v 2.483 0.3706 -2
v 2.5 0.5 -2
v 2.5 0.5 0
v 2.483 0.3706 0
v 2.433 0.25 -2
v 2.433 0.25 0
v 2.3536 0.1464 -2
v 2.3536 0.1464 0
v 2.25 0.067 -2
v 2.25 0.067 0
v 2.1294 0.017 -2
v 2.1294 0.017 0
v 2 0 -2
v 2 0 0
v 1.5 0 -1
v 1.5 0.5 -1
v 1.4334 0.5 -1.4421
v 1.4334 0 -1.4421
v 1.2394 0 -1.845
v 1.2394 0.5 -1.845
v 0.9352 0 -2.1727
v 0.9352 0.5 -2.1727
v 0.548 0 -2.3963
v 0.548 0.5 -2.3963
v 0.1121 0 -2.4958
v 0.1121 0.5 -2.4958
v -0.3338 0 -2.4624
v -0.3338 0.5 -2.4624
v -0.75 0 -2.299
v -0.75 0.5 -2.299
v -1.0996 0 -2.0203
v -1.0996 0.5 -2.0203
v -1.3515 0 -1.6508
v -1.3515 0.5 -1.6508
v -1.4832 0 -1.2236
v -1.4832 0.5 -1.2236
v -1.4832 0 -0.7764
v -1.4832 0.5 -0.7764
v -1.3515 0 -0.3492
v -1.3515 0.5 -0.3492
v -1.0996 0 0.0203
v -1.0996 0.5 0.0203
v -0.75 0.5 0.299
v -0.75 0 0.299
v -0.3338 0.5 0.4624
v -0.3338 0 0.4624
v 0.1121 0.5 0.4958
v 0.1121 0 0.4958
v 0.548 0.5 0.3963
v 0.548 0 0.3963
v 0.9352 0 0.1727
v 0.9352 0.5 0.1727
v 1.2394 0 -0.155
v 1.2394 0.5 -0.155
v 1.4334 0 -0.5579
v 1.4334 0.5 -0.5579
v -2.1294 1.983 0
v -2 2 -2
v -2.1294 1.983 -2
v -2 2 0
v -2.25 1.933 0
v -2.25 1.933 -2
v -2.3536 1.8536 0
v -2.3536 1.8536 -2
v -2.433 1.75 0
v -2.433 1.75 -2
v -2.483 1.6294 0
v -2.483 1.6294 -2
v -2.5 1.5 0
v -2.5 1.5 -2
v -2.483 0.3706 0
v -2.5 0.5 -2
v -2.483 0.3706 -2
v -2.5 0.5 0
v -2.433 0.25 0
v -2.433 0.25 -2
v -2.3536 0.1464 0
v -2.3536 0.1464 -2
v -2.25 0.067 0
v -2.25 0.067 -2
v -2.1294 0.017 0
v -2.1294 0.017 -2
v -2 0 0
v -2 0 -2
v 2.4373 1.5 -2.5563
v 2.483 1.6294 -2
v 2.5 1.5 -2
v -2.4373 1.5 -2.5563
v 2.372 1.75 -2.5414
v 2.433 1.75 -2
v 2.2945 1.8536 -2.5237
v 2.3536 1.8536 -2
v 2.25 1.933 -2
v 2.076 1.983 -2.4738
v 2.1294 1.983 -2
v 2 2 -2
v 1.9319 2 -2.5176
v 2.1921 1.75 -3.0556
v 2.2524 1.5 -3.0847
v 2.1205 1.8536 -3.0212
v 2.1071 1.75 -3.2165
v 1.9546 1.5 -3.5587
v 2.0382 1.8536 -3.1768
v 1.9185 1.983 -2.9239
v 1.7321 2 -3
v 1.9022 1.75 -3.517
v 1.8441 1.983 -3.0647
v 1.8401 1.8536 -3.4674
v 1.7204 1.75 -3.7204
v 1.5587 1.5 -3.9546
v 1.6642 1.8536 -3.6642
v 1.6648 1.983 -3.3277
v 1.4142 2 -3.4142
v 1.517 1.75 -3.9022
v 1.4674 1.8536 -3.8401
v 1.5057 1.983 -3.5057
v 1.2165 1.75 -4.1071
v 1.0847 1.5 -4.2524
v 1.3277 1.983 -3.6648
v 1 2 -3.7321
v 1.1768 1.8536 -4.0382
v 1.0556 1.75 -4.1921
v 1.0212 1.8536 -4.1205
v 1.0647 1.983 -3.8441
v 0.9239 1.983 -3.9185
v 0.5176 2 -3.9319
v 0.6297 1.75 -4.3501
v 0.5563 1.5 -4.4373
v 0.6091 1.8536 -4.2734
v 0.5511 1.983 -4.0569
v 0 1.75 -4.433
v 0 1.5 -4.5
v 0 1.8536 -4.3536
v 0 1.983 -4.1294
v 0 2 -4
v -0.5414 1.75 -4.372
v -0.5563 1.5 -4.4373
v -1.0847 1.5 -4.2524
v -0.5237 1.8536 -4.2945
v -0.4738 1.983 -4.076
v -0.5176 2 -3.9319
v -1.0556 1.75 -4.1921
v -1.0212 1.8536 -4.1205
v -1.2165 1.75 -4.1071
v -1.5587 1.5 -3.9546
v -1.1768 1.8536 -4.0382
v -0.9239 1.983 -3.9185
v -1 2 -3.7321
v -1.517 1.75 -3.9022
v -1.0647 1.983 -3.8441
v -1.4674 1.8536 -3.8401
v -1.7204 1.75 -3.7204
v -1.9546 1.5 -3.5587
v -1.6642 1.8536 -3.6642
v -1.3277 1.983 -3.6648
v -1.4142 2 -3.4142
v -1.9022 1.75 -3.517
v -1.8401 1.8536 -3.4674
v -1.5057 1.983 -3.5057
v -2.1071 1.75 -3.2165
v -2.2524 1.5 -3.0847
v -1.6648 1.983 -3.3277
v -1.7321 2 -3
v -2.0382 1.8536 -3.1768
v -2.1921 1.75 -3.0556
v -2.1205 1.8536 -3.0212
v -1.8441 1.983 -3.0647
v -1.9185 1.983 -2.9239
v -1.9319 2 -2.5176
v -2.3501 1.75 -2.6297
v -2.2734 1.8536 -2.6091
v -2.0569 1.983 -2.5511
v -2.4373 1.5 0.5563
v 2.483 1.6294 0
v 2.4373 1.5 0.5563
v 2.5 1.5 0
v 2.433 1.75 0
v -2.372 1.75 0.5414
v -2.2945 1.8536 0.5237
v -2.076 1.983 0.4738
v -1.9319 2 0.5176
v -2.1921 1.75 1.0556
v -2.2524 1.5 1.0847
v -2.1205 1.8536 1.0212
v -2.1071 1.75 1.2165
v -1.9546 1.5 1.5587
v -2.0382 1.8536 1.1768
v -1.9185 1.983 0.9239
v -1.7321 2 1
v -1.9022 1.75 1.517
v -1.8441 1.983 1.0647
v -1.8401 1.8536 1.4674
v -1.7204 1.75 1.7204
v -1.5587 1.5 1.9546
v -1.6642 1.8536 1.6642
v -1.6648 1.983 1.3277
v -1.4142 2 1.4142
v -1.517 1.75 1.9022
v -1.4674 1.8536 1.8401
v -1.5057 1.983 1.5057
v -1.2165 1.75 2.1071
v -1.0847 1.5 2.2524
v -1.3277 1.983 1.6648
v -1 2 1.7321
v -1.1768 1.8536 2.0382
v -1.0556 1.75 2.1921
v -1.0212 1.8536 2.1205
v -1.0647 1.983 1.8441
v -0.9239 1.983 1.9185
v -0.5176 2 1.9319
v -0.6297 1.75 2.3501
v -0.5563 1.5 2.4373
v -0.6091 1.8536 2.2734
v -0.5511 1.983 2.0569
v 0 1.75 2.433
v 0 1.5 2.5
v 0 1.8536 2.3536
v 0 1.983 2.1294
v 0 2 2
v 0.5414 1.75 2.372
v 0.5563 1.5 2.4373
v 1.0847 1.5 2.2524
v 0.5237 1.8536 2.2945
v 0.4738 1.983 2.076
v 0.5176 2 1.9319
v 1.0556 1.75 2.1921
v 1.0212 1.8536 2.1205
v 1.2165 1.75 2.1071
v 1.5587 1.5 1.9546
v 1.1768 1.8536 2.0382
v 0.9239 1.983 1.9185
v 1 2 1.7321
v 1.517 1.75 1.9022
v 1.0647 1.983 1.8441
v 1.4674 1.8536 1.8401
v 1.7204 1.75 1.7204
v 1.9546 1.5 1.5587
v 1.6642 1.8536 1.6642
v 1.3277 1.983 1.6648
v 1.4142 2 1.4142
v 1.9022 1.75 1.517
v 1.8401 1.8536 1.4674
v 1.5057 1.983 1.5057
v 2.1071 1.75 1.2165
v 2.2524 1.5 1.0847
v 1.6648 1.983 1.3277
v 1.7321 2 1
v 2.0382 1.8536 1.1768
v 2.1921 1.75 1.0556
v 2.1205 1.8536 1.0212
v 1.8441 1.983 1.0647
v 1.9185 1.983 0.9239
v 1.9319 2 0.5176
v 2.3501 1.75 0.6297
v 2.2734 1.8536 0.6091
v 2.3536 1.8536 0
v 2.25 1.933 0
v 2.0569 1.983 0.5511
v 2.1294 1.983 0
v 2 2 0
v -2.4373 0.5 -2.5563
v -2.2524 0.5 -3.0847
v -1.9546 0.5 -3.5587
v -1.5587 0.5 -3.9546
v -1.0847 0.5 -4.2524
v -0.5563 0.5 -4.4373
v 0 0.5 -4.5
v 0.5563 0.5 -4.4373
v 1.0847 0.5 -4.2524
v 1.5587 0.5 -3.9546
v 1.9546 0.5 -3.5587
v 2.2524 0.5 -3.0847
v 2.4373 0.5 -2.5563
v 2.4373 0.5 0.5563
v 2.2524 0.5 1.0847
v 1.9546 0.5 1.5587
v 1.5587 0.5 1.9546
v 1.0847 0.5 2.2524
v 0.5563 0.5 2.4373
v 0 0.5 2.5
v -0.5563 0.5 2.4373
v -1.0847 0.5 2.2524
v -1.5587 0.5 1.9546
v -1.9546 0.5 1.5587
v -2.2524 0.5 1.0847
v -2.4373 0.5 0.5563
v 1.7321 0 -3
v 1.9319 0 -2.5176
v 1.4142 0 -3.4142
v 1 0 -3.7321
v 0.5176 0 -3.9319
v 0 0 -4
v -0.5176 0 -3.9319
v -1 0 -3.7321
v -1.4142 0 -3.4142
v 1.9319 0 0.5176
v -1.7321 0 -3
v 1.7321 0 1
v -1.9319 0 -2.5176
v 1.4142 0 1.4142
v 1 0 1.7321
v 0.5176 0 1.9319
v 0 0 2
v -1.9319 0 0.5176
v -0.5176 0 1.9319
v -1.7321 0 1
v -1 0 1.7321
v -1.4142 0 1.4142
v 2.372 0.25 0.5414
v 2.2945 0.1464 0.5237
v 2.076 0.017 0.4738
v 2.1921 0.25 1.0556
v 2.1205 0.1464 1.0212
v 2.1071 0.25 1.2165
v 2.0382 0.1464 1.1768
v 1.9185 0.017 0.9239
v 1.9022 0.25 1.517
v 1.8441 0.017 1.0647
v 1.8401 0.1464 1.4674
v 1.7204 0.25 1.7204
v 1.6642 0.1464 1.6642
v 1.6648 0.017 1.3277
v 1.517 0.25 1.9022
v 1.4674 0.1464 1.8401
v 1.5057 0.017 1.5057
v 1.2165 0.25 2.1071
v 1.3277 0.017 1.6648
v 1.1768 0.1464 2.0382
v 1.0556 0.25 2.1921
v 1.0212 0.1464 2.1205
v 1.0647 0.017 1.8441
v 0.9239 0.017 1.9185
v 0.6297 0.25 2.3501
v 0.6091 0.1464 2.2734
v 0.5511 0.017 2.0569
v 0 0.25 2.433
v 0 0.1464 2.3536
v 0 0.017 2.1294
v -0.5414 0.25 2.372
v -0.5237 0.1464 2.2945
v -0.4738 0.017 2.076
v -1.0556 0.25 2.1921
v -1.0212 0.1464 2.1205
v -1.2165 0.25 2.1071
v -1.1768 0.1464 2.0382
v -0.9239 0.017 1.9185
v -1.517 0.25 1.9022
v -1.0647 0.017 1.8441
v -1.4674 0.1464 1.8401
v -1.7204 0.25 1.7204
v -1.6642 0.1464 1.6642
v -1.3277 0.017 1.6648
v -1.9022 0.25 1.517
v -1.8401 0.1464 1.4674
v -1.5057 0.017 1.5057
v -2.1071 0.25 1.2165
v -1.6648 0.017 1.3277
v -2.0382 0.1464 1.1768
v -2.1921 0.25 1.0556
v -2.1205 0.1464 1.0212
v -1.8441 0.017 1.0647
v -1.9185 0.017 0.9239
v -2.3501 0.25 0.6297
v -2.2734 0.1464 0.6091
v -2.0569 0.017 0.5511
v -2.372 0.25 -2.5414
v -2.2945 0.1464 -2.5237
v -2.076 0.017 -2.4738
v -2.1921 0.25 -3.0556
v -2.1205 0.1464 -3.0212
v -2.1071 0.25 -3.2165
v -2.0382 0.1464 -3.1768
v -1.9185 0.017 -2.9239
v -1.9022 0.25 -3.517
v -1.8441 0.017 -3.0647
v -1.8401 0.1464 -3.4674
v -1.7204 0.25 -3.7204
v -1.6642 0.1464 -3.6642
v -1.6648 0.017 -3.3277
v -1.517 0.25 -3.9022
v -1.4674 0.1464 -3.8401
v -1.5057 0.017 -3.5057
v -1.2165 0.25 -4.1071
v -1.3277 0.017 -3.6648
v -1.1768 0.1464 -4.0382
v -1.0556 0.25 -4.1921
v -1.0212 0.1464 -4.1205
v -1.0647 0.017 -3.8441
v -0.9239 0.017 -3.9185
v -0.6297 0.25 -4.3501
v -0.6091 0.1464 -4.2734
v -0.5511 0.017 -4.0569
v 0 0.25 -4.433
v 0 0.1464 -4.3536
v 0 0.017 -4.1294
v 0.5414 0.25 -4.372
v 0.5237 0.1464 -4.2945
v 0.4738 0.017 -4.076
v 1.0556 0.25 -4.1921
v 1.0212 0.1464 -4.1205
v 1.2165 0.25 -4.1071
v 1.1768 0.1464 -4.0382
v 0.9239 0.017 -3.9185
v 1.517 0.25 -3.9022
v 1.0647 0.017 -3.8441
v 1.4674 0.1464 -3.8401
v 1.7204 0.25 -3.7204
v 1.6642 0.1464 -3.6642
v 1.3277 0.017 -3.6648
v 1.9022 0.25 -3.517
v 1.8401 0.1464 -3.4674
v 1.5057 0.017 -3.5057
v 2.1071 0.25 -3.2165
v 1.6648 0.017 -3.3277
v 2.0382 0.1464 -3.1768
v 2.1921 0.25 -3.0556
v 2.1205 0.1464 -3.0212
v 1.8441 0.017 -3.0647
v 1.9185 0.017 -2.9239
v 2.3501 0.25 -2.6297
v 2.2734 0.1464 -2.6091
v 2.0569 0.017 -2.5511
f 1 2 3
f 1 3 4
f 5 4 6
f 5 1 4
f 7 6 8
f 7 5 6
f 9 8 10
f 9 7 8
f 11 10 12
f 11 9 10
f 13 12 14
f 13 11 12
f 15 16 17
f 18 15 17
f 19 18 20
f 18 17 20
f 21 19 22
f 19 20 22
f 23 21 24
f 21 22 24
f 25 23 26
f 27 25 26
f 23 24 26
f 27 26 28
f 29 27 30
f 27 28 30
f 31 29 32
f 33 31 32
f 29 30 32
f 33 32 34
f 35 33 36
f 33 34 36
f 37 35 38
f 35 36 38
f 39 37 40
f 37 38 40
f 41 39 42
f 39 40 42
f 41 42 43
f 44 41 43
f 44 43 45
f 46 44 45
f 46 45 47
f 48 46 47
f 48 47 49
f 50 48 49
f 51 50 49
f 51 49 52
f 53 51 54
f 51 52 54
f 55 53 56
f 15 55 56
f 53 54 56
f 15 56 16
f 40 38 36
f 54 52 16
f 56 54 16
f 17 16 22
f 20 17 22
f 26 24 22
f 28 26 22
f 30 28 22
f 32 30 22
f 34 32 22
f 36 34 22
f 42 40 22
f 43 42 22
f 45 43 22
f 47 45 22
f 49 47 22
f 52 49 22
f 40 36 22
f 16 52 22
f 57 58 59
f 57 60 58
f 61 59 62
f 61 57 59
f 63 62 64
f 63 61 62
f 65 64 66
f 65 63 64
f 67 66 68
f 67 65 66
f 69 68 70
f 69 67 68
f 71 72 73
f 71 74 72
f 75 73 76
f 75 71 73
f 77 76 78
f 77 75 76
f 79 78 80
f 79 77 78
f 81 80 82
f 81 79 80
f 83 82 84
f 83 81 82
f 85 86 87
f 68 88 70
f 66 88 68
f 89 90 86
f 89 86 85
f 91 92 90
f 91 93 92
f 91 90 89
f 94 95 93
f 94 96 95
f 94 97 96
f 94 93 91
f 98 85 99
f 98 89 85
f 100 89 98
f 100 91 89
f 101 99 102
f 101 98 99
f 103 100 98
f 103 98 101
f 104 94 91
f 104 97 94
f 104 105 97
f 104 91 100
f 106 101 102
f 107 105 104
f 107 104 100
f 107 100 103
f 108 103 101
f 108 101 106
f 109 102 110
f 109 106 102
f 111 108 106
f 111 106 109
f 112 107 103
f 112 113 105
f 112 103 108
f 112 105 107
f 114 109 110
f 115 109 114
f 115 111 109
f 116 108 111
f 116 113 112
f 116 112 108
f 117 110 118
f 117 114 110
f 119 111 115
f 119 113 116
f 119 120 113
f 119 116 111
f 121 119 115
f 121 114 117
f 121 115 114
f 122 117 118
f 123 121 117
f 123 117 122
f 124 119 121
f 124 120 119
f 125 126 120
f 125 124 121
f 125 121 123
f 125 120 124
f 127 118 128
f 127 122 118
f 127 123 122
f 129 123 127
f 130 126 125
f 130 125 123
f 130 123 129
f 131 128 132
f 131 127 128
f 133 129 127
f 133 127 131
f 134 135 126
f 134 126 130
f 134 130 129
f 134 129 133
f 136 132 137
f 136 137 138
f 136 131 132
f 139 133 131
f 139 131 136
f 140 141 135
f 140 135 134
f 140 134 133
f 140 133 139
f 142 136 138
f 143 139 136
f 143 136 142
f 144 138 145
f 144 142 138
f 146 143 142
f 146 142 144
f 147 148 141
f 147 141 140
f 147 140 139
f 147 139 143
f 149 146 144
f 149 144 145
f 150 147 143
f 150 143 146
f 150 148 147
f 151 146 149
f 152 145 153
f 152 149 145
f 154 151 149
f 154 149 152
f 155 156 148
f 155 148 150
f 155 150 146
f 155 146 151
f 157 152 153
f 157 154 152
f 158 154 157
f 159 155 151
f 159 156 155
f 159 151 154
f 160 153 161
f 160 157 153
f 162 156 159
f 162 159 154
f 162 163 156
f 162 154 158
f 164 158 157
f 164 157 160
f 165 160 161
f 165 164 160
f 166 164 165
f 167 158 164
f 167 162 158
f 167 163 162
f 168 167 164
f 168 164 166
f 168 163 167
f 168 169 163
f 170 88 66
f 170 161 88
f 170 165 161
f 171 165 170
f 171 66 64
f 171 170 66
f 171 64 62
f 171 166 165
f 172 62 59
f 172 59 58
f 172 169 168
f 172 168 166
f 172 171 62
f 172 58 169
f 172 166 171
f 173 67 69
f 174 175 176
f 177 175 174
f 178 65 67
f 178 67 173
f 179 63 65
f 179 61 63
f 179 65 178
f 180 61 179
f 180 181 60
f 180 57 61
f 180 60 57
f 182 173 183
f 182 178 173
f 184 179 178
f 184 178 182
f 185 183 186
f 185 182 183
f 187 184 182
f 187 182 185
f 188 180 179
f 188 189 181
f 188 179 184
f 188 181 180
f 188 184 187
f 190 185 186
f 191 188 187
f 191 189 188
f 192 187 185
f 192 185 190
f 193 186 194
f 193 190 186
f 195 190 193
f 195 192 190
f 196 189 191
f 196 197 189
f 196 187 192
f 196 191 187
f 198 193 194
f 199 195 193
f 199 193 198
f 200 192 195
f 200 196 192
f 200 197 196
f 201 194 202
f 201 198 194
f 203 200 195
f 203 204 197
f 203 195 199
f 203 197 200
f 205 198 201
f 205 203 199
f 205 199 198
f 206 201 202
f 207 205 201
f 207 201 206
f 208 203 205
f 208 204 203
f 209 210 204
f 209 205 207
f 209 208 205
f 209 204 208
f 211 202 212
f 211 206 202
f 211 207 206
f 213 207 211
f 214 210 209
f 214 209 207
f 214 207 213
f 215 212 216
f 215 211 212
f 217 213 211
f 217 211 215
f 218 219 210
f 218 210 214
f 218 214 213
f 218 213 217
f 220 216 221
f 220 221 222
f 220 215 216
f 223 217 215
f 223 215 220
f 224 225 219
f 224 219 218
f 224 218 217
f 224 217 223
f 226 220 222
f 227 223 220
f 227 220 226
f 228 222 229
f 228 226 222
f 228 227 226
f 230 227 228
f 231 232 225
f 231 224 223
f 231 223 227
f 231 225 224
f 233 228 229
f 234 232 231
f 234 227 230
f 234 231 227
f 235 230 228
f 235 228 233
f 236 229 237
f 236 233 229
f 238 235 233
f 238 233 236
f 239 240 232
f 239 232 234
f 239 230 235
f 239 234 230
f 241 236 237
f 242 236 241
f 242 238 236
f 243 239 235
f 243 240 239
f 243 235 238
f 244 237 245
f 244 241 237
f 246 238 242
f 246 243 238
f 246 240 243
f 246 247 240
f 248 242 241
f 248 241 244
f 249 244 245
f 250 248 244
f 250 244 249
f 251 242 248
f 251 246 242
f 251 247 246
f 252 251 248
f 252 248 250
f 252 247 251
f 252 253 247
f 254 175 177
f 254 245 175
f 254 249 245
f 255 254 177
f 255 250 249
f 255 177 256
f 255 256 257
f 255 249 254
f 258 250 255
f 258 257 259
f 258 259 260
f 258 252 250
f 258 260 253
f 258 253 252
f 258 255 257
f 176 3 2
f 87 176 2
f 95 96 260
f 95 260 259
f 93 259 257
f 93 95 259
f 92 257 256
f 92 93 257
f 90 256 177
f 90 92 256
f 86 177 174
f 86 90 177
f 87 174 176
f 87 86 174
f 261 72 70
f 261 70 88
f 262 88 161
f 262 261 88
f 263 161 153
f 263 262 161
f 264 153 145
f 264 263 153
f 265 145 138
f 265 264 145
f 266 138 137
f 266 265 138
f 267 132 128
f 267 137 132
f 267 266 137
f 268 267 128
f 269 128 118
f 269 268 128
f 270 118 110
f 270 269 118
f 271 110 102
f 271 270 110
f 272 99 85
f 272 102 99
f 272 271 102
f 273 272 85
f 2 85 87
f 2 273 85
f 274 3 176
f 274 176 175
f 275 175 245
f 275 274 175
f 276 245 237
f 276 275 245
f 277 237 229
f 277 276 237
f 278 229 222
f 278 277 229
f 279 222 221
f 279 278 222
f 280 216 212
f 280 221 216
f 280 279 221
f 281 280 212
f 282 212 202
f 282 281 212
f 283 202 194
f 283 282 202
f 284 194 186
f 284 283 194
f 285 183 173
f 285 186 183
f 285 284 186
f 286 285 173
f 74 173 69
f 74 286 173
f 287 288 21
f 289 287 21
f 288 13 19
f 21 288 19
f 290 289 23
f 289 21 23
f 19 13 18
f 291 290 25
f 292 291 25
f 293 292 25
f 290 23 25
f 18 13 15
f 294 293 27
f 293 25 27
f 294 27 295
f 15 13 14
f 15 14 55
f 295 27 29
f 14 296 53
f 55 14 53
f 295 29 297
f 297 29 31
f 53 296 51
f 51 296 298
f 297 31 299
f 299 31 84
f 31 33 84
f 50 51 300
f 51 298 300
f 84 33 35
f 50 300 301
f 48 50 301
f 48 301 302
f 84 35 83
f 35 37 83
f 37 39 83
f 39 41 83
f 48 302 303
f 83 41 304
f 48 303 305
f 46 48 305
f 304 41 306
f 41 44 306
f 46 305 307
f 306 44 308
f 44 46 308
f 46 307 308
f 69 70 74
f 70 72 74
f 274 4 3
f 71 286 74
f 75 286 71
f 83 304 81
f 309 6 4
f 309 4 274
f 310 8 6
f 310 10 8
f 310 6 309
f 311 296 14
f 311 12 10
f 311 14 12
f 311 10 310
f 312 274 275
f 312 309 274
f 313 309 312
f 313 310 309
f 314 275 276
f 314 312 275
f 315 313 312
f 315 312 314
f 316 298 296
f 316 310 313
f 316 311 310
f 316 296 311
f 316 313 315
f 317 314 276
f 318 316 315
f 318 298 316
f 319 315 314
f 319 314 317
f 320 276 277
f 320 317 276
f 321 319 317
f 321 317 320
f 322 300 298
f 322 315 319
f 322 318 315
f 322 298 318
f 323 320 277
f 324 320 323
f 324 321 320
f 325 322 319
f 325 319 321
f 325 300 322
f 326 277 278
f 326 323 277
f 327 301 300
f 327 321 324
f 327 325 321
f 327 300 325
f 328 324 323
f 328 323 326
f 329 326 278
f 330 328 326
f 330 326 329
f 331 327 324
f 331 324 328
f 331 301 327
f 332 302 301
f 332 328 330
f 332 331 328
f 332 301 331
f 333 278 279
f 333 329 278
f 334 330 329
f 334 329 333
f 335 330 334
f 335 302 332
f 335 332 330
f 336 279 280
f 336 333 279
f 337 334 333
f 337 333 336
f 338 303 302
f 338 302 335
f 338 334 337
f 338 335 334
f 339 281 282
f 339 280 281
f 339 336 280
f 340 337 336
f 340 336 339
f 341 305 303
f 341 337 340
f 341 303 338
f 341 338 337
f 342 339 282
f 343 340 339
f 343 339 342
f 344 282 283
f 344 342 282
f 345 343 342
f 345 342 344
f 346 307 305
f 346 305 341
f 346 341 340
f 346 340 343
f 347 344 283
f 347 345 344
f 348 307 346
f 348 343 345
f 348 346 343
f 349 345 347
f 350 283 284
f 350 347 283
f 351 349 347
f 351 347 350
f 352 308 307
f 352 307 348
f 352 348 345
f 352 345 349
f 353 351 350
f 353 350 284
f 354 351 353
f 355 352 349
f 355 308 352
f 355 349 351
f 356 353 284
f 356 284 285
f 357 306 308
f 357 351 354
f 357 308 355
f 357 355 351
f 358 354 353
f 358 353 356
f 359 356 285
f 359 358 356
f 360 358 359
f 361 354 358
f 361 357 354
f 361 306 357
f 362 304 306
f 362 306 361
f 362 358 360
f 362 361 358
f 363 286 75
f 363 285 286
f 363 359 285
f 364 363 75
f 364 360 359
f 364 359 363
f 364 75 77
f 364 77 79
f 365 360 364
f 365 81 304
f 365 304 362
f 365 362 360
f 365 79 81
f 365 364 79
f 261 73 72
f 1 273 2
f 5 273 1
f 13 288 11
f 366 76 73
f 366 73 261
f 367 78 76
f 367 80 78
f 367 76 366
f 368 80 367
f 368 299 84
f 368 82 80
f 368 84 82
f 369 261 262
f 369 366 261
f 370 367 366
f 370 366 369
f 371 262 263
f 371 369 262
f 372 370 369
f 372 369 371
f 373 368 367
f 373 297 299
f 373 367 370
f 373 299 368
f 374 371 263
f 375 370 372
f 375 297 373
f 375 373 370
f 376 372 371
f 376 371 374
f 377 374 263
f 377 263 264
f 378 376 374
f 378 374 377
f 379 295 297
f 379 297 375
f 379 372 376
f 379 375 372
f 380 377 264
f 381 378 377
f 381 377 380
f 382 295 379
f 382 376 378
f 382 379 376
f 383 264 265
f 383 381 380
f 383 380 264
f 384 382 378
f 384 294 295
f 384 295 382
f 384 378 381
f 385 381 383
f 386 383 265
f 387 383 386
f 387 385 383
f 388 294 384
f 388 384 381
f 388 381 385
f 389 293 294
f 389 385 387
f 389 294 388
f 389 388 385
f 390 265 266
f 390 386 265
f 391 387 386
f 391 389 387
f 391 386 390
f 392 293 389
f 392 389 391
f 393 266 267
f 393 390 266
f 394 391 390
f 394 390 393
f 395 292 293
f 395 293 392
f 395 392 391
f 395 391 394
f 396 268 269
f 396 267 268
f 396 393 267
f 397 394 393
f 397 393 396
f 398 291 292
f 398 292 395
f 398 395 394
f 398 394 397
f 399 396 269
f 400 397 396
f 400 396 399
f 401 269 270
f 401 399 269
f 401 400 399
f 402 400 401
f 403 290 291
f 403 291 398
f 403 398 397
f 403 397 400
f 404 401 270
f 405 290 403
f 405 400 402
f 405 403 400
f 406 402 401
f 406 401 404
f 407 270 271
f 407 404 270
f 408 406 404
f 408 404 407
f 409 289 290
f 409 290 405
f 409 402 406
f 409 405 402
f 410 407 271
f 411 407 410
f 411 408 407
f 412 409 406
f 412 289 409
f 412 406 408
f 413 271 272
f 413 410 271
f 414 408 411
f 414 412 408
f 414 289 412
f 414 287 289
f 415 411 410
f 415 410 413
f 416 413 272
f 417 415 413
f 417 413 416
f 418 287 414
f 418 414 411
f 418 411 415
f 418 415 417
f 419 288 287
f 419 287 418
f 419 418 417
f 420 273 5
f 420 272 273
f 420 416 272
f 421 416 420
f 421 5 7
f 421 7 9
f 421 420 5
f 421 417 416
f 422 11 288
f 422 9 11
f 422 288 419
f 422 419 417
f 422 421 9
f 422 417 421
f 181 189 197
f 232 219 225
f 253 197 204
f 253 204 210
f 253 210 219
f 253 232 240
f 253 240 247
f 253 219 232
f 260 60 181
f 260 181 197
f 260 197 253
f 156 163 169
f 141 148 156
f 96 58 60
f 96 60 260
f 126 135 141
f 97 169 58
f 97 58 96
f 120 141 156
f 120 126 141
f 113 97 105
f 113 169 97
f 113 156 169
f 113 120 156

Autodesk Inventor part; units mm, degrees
ref_plane "YZ Plane" through (0, 0, 0) normal (1, 0, 0) x (0, 1, 0)
ref_plane "XZ Plane" through (0, 0, 0) normal (0, 1, 0) x (-1, 0, 0)
ref_plane "XY Plane" through (0, 0, 0) normal (0, 0, 1) x (1, 0, 0)
sketch "Sketch1" plane through (0, 0, 0) normal (0, 1, 0) x (-1, 0, 0)
  line L0 (0, 0) -> (0, -2) construction
  line L1 (-2.5, 0) -> (-2.5, -2)
  line L2 (2.5, -2) -> (2.5, 0)
  arc A0 (2.5, 0) -> (-2.5, 0) centre (0, 0) ccw
  arc A1 (-2.5, -2) -> (2.5, -2) centre (0, -2) ccw
  point P0 (0, -1)
  dimension "d0" = 2.5
  dimension "d1" = 2
extrude "Extrusion1" add sketch "Sketch1" along normal blind 2
sketch "Sketch2" plane through (0, 2, 0) normal (0, 1, 0) x (1, 0, 0)
  circle A0 centre (0, 1) radius 1.5
  line L0 (-2.5, 2) -> (-2.5, 0) projected
  point P0 (0, 0)
  point P1 (-2.5, 1)
  dimension "d4" = 3
extrude "Extrusion2" cut sketch "Sketch2" against normal blind 12.25
fillet "Fillet1" radius 0.5 8 edges at (2.5, 2, -1) (0, 2, -4.5) (-2.5, 2, -1) (0, 2, 2.5) (2.5, 0, -1) (0, 0, -4.5) (-2.5, 0, -1) (0, 0, 2.5)
sketch "Sketch3" plane through (0, 2, 0) normal (0, 1, 0) x (1, 0, 0)
  circle A0 centre (0, 1) radius 1.5 projected
  point P0 (0, 0)
extrude "Extrusion3" add sketch "Sketch3" against normal blind 1.5
properties part number "Ползунок"
